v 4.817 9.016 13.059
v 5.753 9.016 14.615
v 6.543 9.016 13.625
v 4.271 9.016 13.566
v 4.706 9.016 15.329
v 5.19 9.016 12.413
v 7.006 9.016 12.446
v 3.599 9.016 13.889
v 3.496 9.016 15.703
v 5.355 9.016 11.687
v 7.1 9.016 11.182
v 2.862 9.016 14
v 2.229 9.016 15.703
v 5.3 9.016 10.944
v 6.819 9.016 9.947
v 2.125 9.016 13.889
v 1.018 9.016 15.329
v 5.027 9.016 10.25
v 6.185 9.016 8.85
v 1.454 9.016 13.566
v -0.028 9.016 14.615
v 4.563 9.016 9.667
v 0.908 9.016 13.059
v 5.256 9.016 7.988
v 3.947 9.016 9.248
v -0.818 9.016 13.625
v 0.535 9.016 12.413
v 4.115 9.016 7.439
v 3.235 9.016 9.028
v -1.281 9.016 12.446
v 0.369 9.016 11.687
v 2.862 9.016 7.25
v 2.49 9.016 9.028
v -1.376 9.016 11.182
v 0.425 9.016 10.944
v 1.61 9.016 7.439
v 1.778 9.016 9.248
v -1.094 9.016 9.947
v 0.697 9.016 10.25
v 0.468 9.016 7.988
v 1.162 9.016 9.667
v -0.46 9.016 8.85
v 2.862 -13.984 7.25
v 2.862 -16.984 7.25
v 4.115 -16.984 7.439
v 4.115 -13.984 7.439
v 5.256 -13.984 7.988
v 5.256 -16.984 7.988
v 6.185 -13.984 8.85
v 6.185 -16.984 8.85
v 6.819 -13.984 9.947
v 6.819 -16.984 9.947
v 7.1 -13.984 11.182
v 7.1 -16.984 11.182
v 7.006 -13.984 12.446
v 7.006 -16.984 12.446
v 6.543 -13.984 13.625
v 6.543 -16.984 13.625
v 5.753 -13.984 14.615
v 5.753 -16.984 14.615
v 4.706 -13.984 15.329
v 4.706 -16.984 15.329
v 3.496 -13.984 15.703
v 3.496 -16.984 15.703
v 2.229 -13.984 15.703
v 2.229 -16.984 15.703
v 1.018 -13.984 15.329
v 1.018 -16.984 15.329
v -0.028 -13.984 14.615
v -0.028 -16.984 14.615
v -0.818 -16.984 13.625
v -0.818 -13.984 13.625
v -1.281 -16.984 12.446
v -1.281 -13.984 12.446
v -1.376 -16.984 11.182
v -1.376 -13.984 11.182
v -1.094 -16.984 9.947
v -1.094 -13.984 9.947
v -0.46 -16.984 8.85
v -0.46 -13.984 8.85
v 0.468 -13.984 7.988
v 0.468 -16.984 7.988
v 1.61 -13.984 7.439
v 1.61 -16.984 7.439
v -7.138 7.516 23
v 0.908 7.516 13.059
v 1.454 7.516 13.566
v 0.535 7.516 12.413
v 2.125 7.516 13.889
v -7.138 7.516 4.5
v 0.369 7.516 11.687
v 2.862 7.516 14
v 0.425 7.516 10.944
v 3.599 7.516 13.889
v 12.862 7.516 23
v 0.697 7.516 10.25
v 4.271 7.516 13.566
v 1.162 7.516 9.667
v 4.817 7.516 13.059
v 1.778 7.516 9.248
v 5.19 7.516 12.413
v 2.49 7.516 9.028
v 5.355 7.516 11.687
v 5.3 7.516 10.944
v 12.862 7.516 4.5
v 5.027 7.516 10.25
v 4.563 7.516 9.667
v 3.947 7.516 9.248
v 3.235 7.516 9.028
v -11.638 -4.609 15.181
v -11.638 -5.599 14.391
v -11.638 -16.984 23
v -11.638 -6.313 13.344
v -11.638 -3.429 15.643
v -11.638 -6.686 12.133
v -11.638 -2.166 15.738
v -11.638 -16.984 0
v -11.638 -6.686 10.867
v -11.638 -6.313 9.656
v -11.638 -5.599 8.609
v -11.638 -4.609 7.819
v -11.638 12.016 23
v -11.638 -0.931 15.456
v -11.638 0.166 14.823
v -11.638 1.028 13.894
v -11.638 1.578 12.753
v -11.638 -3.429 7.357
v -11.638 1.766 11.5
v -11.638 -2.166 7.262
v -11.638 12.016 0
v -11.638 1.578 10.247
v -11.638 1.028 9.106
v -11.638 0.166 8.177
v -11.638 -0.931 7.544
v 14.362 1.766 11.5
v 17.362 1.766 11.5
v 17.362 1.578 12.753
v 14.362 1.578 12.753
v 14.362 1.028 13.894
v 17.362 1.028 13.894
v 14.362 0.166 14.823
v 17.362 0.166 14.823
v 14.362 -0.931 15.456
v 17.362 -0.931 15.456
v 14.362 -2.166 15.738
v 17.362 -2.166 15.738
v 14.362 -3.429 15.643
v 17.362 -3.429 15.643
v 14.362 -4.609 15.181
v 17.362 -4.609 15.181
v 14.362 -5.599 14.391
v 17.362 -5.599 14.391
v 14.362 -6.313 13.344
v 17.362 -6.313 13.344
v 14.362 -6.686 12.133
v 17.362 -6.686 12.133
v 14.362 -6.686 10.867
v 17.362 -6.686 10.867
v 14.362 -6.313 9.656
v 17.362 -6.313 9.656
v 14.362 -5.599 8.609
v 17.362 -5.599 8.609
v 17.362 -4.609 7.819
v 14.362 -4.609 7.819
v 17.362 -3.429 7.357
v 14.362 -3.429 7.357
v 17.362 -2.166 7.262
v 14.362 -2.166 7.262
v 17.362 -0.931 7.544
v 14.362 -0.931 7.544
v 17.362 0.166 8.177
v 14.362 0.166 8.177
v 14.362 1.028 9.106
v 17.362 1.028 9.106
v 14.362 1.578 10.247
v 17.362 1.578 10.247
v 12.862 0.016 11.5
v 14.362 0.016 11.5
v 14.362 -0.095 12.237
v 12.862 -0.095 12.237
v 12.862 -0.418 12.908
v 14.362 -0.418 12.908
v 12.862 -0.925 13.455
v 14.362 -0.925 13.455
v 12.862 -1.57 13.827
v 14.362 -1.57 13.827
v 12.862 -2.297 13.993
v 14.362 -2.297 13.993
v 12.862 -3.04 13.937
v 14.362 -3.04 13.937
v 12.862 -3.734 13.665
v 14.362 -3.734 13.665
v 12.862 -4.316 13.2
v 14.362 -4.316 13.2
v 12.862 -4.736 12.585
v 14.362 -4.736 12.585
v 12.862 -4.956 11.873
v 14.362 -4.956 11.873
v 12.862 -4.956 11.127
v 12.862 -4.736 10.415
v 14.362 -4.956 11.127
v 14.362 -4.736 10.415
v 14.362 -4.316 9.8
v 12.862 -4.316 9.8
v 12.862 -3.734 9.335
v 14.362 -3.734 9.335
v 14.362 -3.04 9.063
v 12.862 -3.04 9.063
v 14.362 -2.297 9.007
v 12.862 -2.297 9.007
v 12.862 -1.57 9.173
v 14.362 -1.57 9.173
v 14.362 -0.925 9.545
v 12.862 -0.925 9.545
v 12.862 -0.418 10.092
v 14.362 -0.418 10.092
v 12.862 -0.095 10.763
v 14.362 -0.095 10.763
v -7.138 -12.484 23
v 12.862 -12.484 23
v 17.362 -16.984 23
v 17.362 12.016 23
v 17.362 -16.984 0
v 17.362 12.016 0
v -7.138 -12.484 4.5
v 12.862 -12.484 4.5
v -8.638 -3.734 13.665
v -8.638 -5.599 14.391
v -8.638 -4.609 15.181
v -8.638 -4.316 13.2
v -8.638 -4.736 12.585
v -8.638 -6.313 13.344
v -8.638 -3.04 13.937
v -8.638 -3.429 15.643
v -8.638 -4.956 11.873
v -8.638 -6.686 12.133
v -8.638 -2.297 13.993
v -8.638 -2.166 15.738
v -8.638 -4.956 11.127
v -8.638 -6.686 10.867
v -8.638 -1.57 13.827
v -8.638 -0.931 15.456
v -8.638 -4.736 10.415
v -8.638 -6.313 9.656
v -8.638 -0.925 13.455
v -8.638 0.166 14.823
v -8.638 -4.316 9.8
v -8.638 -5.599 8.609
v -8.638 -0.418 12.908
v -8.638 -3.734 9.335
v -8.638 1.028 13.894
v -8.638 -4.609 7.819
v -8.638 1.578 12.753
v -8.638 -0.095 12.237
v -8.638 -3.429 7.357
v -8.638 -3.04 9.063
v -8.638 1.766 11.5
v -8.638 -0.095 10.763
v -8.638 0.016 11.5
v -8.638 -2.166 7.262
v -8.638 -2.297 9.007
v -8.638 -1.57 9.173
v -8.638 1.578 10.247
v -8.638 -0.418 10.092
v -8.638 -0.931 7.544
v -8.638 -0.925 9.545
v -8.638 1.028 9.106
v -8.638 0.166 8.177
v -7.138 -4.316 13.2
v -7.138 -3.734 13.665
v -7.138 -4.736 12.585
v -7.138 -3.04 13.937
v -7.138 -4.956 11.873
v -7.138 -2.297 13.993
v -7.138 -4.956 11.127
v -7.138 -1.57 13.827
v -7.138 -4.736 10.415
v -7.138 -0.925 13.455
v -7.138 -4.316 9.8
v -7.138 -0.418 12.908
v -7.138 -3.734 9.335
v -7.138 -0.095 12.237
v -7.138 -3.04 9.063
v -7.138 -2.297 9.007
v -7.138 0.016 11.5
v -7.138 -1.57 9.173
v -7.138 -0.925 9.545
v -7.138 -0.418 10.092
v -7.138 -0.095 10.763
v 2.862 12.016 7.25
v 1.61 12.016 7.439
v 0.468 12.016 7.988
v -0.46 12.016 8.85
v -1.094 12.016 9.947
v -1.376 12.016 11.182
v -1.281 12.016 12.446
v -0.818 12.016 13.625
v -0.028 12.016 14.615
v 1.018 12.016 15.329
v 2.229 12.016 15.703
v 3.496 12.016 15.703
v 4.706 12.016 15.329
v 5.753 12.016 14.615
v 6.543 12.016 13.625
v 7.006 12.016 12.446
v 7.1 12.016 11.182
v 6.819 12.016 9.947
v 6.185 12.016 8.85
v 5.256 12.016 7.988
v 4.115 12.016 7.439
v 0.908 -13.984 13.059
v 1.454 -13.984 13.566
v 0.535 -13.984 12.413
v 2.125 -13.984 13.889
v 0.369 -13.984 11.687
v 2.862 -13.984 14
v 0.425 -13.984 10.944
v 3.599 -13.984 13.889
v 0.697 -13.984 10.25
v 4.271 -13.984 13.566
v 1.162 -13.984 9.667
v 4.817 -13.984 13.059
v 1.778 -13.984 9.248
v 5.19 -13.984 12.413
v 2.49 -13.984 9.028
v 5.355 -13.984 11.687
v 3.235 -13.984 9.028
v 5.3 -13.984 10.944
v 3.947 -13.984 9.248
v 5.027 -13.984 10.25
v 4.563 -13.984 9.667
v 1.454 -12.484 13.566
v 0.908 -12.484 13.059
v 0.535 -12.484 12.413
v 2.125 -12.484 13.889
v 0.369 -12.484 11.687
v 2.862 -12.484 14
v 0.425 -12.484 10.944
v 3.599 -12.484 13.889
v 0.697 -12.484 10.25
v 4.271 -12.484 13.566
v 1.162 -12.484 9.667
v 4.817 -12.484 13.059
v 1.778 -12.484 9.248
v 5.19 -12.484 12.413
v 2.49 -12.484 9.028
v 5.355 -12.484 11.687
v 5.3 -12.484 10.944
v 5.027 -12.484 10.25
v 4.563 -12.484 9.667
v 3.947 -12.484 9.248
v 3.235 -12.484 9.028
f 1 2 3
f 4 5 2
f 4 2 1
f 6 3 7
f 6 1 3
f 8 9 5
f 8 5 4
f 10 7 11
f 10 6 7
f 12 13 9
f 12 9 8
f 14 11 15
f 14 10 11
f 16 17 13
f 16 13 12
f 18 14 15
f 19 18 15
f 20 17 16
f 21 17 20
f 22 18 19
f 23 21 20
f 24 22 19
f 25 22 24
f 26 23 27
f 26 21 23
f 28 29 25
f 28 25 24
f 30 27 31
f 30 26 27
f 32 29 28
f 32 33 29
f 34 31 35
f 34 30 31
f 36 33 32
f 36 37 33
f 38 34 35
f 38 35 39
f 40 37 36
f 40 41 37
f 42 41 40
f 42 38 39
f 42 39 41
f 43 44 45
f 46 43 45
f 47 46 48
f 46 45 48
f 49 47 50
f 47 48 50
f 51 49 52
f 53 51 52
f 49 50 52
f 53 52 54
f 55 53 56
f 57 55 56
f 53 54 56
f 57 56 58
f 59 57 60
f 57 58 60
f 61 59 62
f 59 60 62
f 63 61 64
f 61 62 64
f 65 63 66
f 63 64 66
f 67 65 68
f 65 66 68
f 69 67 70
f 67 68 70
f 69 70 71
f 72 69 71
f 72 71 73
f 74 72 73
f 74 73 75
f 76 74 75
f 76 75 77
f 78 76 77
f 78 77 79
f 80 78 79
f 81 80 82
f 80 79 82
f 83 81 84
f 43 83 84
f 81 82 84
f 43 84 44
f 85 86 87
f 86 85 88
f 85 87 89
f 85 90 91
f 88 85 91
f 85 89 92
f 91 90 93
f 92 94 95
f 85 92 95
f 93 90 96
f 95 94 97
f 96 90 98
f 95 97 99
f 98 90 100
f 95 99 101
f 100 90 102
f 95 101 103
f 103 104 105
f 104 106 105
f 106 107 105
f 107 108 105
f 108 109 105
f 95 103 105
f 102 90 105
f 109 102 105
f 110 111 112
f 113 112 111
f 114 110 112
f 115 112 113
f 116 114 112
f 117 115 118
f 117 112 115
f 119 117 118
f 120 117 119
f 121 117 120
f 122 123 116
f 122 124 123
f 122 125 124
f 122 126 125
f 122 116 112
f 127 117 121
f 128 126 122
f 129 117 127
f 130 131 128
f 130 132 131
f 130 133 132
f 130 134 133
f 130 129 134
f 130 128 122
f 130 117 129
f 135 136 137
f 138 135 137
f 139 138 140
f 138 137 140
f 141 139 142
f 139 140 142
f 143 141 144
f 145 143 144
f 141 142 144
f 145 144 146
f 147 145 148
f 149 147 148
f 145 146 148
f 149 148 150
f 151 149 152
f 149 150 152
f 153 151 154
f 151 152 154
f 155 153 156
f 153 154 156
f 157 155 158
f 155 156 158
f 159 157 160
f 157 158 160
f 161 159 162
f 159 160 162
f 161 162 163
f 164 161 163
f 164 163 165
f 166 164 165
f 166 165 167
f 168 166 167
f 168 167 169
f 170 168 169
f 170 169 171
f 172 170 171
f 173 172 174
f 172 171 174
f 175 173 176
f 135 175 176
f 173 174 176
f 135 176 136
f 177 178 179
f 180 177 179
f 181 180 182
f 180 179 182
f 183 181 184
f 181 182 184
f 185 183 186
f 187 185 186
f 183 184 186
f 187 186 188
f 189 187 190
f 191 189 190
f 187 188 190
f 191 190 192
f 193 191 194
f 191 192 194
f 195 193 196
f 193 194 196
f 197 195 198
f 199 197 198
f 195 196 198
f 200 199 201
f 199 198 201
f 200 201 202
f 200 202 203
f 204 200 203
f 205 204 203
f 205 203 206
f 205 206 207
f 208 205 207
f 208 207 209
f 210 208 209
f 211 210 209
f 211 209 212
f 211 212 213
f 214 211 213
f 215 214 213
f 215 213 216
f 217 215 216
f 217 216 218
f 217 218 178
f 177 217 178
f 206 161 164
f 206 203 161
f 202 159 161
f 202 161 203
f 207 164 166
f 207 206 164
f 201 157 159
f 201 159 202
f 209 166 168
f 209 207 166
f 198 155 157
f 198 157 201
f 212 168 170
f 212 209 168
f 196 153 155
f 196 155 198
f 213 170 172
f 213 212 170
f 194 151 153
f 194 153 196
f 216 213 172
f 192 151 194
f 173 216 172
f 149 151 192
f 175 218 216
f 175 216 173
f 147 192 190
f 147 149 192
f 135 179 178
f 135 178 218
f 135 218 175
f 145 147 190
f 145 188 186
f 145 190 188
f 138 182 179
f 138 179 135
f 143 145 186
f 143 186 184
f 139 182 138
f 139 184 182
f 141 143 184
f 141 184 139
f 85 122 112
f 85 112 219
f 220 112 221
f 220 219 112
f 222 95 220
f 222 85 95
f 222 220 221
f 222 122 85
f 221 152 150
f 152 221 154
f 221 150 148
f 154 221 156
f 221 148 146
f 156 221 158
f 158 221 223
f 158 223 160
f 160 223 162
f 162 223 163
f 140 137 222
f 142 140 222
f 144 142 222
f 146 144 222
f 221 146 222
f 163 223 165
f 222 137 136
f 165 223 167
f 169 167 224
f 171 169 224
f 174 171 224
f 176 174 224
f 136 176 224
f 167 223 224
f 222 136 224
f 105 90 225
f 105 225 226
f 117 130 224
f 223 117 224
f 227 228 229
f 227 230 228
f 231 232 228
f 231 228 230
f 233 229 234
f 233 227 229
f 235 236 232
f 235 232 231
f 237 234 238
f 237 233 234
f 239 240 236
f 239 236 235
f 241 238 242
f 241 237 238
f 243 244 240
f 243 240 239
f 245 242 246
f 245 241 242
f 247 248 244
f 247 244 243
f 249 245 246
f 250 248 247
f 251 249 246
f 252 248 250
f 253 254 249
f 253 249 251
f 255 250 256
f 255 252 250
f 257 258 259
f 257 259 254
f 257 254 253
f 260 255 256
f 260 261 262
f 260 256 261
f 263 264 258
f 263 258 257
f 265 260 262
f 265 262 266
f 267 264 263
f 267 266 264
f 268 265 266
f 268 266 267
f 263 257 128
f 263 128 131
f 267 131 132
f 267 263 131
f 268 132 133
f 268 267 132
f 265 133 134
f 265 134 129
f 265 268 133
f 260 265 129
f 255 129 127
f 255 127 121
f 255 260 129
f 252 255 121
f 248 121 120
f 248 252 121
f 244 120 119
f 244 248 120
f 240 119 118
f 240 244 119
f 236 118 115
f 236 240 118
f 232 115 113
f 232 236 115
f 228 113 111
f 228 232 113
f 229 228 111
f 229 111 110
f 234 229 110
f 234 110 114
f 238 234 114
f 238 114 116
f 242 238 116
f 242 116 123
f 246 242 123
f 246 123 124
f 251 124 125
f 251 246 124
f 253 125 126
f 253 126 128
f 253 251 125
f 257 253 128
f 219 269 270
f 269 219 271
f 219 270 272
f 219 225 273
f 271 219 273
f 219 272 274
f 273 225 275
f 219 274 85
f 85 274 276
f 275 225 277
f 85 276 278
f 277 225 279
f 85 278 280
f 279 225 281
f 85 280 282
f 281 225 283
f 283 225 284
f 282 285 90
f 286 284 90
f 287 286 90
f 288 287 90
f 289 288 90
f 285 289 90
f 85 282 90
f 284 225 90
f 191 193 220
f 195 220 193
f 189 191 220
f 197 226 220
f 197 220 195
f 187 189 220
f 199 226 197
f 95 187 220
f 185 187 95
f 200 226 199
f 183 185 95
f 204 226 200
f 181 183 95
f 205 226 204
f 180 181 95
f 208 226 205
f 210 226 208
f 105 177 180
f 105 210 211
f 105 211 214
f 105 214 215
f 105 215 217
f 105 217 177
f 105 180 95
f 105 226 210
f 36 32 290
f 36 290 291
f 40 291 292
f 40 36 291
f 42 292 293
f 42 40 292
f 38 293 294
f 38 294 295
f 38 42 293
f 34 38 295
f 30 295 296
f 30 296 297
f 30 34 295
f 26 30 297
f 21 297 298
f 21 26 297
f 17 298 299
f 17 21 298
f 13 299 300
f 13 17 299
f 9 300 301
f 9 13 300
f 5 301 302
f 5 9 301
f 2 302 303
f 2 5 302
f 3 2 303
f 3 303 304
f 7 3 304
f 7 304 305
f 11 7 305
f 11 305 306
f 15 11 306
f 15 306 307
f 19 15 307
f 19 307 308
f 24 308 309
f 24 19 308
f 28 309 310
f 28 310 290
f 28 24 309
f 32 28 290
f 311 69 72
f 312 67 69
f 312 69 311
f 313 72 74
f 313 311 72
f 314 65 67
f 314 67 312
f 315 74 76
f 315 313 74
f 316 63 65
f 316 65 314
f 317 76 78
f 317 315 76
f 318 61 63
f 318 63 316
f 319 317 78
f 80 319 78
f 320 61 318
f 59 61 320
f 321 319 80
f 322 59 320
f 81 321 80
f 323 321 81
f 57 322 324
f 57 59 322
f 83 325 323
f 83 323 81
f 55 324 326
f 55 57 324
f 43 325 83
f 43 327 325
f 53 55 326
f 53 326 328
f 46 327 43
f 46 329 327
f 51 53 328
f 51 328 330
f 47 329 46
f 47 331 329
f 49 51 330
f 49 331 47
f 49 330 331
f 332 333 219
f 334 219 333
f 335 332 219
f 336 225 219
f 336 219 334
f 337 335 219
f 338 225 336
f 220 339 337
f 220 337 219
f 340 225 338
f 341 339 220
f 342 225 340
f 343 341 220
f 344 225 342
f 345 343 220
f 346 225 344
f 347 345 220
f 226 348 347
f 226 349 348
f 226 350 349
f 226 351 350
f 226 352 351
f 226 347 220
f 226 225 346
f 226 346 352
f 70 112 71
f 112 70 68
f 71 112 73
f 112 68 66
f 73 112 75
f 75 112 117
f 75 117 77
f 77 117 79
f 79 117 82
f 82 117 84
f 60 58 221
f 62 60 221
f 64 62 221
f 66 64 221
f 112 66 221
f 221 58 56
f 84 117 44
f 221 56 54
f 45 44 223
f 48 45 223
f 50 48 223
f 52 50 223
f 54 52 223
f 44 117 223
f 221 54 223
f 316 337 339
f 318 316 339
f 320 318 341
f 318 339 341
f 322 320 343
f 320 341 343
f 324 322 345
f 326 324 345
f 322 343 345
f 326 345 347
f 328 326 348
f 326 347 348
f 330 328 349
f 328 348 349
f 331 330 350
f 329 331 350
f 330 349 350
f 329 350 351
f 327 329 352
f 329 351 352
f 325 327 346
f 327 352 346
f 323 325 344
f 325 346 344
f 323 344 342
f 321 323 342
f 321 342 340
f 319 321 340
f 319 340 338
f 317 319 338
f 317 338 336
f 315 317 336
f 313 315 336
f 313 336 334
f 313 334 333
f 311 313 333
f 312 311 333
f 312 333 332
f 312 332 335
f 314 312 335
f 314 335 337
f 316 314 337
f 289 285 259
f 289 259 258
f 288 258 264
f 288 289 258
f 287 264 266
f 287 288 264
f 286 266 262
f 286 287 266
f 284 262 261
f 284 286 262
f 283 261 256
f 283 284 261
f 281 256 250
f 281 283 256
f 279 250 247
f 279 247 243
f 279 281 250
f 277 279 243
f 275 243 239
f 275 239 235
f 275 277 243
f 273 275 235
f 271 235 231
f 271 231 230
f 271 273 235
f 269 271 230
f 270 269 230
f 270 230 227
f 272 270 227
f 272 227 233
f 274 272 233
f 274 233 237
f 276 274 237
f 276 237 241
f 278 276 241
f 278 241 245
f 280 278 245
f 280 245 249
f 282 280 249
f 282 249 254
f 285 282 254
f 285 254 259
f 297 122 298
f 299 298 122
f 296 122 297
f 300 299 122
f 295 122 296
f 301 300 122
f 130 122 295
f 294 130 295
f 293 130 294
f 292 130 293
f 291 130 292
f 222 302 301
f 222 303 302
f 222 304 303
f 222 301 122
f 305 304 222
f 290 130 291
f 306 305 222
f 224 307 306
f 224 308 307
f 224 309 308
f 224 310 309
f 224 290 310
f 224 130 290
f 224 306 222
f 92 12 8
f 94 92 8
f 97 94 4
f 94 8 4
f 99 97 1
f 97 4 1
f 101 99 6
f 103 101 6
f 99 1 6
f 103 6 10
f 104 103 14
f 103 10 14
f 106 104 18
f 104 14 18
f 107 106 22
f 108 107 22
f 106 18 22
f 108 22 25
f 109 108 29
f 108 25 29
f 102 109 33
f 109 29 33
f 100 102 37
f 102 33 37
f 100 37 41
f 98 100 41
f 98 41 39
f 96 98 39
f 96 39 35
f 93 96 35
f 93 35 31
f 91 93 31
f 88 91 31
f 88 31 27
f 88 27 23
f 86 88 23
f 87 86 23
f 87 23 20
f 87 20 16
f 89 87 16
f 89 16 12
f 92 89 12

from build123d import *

# Parameters (mm, degrees)
SKETCH2_W           = 29
SKETCH2_H           = 29
BOSS_EXTRUDE3_DEPTH = 23
SHELL3_T            = -4.5
SKETCH7_R           = 4.25
CUT_EXTRUDE9_DEPTH  = 3
SKETCH10_R          = 4.25
CUT_EXTRUDE10_DEPTH = 3
CUT_EXTRUDE11_START = -3
SKETCH9_R           = 4.25
CUT_EXTRUDE11_DEPTH = 3
CUT_EXTRUDE12_START = -3
SKETCH8_R           = 4.25
CUT_EXTRUDE12_DEPTH = 3
SKETCH12_R          = 2.5
CUT_EXTRUDE13_DEPTH = 39.813018756
SKETCH13_R          = 2.5
CUT_EXTRUDE14_DEPTH = 11.5
CUT_EXTRUDE15_START = -11.5
SKETCH14_R          = 2.5
CUT_EXTRUDE15_DEPTH = 11.5


with BuildPart() as part:
    # Sketch2 → Boss-Extrude3 (new body)
    with BuildSketch(Plane.XY):
        with Locations((2.862327752, -2.483638693)):
            Rectangle(SKETCH2_W, SKETCH2_H)
    extrude(amount=BOSS_EXTRUDE3_DEPTH)

    # Shell3
    shell3_openings = [part.faces().sort_by_distance(p)[0] for p in [
        (2.862327752, -2.483638693, 23),
    ]]
    offset(amount=SHELL3_T, openings=shell3_openings, kind=Kind.INTERSECTION)

    # Sketch7 → Cut-Extrude9 (cut)
    with BuildSketch(Plane(origin=(0, -16.983638693, 0), x_dir=(-1, 0, 0), z_dir=(0, -1, 0))):
        with Locations(Location((-2.862327752, -11.5, 0), (0, 0, 90))):
            Circle(SKETCH7_R)
    extrude(amount=-CUT_EXTRUDE9_DEPTH, mode=Mode.SUBTRACT)

    # Sketch10 → Cut-Extrude10 (cut)
    with BuildSketch(Plane(origin=(17.362327752, 0, 0), x_dir=(0, 0, -1), z_dir=(1, 0, 0))):
        with Locations(Location((-11.5, -2.483638693, 0), (0, 0, 90))):
            Circle(SKETCH10_R)
    extrude(amount=-CUT_EXTRUDE10_DEPTH, mode=Mode.SUBTRACT)

    # Sketch9 → Cut-Extrude11 (cut)
    with BuildSketch(Plane(origin=(0, 12.016361307, 0), x_dir=(1, 0, 0), z_dir=(0, 1, 0)).offset(CUT_EXTRUDE11_START)):
        with Locations(Location((2.862327752, -11.5, 0), (0, 0, 90))):
            Circle(SKETCH9_R)
    extrude(amount=CUT_EXTRUDE11_DEPTH, mode=Mode.SUBTRACT)

    # Sketch8 → Cut-Extrude12 (cut)
    with BuildSketch(Plane.ZY.offset(11.637672248).offset(CUT_EXTRUDE12_START)):
        with Locations(Location((11.5, -2.483638693, 0), (0, 0, 90))):
            Circle(SKETCH8_R)
    extrude(amount=CUT_EXTRUDE12_DEPTH, mode=Mode.SUBTRACT)

    # Sketch12 → Cut-Extrude13 (cut, through all)
    with BuildSketch(Plane(origin=(0, 9.016361307, 0), x_dir=(1, 0, 0), z_dir=(0, 1, 0))):
        with Locations(Location((2.862327752, -11.5, 0), (0, 0, 270))):
            Circle(SKETCH12_R)
    extrude(amount=-CUT_EXTRUDE13_DEPTH, mode=Mode.SUBTRACT)

    # Sketch13 → Cut-Extrude14 (cut)
    with BuildSketch(Plane(origin=(14.362327752, 0, 0), x_dir=(0, 0, -1), z_dir=(1, 0, 0))):
        with Locations(Location((-11.5, -2.483638693, 0), (0, 0, 90))):
            Circle(SKETCH13_R)
    extrude(amount=-CUT_EXTRUDE14_DEPTH, mode=Mode.SUBTRACT)

    # Sketch14 → Cut-Extrude15 (cut)
    with BuildSketch(Plane.ZY.offset(8.637672248).offset(CUT_EXTRUDE15_START)):
        with Locations(Location((11.5, -2.483638693, 0), (0, 0, 90))):
            Circle(SKETCH14_R)
    extrude(amount=CUT_EXTRUDE15_DEPTH, mode=Mode.SUBTRACT)


solid = part.part
